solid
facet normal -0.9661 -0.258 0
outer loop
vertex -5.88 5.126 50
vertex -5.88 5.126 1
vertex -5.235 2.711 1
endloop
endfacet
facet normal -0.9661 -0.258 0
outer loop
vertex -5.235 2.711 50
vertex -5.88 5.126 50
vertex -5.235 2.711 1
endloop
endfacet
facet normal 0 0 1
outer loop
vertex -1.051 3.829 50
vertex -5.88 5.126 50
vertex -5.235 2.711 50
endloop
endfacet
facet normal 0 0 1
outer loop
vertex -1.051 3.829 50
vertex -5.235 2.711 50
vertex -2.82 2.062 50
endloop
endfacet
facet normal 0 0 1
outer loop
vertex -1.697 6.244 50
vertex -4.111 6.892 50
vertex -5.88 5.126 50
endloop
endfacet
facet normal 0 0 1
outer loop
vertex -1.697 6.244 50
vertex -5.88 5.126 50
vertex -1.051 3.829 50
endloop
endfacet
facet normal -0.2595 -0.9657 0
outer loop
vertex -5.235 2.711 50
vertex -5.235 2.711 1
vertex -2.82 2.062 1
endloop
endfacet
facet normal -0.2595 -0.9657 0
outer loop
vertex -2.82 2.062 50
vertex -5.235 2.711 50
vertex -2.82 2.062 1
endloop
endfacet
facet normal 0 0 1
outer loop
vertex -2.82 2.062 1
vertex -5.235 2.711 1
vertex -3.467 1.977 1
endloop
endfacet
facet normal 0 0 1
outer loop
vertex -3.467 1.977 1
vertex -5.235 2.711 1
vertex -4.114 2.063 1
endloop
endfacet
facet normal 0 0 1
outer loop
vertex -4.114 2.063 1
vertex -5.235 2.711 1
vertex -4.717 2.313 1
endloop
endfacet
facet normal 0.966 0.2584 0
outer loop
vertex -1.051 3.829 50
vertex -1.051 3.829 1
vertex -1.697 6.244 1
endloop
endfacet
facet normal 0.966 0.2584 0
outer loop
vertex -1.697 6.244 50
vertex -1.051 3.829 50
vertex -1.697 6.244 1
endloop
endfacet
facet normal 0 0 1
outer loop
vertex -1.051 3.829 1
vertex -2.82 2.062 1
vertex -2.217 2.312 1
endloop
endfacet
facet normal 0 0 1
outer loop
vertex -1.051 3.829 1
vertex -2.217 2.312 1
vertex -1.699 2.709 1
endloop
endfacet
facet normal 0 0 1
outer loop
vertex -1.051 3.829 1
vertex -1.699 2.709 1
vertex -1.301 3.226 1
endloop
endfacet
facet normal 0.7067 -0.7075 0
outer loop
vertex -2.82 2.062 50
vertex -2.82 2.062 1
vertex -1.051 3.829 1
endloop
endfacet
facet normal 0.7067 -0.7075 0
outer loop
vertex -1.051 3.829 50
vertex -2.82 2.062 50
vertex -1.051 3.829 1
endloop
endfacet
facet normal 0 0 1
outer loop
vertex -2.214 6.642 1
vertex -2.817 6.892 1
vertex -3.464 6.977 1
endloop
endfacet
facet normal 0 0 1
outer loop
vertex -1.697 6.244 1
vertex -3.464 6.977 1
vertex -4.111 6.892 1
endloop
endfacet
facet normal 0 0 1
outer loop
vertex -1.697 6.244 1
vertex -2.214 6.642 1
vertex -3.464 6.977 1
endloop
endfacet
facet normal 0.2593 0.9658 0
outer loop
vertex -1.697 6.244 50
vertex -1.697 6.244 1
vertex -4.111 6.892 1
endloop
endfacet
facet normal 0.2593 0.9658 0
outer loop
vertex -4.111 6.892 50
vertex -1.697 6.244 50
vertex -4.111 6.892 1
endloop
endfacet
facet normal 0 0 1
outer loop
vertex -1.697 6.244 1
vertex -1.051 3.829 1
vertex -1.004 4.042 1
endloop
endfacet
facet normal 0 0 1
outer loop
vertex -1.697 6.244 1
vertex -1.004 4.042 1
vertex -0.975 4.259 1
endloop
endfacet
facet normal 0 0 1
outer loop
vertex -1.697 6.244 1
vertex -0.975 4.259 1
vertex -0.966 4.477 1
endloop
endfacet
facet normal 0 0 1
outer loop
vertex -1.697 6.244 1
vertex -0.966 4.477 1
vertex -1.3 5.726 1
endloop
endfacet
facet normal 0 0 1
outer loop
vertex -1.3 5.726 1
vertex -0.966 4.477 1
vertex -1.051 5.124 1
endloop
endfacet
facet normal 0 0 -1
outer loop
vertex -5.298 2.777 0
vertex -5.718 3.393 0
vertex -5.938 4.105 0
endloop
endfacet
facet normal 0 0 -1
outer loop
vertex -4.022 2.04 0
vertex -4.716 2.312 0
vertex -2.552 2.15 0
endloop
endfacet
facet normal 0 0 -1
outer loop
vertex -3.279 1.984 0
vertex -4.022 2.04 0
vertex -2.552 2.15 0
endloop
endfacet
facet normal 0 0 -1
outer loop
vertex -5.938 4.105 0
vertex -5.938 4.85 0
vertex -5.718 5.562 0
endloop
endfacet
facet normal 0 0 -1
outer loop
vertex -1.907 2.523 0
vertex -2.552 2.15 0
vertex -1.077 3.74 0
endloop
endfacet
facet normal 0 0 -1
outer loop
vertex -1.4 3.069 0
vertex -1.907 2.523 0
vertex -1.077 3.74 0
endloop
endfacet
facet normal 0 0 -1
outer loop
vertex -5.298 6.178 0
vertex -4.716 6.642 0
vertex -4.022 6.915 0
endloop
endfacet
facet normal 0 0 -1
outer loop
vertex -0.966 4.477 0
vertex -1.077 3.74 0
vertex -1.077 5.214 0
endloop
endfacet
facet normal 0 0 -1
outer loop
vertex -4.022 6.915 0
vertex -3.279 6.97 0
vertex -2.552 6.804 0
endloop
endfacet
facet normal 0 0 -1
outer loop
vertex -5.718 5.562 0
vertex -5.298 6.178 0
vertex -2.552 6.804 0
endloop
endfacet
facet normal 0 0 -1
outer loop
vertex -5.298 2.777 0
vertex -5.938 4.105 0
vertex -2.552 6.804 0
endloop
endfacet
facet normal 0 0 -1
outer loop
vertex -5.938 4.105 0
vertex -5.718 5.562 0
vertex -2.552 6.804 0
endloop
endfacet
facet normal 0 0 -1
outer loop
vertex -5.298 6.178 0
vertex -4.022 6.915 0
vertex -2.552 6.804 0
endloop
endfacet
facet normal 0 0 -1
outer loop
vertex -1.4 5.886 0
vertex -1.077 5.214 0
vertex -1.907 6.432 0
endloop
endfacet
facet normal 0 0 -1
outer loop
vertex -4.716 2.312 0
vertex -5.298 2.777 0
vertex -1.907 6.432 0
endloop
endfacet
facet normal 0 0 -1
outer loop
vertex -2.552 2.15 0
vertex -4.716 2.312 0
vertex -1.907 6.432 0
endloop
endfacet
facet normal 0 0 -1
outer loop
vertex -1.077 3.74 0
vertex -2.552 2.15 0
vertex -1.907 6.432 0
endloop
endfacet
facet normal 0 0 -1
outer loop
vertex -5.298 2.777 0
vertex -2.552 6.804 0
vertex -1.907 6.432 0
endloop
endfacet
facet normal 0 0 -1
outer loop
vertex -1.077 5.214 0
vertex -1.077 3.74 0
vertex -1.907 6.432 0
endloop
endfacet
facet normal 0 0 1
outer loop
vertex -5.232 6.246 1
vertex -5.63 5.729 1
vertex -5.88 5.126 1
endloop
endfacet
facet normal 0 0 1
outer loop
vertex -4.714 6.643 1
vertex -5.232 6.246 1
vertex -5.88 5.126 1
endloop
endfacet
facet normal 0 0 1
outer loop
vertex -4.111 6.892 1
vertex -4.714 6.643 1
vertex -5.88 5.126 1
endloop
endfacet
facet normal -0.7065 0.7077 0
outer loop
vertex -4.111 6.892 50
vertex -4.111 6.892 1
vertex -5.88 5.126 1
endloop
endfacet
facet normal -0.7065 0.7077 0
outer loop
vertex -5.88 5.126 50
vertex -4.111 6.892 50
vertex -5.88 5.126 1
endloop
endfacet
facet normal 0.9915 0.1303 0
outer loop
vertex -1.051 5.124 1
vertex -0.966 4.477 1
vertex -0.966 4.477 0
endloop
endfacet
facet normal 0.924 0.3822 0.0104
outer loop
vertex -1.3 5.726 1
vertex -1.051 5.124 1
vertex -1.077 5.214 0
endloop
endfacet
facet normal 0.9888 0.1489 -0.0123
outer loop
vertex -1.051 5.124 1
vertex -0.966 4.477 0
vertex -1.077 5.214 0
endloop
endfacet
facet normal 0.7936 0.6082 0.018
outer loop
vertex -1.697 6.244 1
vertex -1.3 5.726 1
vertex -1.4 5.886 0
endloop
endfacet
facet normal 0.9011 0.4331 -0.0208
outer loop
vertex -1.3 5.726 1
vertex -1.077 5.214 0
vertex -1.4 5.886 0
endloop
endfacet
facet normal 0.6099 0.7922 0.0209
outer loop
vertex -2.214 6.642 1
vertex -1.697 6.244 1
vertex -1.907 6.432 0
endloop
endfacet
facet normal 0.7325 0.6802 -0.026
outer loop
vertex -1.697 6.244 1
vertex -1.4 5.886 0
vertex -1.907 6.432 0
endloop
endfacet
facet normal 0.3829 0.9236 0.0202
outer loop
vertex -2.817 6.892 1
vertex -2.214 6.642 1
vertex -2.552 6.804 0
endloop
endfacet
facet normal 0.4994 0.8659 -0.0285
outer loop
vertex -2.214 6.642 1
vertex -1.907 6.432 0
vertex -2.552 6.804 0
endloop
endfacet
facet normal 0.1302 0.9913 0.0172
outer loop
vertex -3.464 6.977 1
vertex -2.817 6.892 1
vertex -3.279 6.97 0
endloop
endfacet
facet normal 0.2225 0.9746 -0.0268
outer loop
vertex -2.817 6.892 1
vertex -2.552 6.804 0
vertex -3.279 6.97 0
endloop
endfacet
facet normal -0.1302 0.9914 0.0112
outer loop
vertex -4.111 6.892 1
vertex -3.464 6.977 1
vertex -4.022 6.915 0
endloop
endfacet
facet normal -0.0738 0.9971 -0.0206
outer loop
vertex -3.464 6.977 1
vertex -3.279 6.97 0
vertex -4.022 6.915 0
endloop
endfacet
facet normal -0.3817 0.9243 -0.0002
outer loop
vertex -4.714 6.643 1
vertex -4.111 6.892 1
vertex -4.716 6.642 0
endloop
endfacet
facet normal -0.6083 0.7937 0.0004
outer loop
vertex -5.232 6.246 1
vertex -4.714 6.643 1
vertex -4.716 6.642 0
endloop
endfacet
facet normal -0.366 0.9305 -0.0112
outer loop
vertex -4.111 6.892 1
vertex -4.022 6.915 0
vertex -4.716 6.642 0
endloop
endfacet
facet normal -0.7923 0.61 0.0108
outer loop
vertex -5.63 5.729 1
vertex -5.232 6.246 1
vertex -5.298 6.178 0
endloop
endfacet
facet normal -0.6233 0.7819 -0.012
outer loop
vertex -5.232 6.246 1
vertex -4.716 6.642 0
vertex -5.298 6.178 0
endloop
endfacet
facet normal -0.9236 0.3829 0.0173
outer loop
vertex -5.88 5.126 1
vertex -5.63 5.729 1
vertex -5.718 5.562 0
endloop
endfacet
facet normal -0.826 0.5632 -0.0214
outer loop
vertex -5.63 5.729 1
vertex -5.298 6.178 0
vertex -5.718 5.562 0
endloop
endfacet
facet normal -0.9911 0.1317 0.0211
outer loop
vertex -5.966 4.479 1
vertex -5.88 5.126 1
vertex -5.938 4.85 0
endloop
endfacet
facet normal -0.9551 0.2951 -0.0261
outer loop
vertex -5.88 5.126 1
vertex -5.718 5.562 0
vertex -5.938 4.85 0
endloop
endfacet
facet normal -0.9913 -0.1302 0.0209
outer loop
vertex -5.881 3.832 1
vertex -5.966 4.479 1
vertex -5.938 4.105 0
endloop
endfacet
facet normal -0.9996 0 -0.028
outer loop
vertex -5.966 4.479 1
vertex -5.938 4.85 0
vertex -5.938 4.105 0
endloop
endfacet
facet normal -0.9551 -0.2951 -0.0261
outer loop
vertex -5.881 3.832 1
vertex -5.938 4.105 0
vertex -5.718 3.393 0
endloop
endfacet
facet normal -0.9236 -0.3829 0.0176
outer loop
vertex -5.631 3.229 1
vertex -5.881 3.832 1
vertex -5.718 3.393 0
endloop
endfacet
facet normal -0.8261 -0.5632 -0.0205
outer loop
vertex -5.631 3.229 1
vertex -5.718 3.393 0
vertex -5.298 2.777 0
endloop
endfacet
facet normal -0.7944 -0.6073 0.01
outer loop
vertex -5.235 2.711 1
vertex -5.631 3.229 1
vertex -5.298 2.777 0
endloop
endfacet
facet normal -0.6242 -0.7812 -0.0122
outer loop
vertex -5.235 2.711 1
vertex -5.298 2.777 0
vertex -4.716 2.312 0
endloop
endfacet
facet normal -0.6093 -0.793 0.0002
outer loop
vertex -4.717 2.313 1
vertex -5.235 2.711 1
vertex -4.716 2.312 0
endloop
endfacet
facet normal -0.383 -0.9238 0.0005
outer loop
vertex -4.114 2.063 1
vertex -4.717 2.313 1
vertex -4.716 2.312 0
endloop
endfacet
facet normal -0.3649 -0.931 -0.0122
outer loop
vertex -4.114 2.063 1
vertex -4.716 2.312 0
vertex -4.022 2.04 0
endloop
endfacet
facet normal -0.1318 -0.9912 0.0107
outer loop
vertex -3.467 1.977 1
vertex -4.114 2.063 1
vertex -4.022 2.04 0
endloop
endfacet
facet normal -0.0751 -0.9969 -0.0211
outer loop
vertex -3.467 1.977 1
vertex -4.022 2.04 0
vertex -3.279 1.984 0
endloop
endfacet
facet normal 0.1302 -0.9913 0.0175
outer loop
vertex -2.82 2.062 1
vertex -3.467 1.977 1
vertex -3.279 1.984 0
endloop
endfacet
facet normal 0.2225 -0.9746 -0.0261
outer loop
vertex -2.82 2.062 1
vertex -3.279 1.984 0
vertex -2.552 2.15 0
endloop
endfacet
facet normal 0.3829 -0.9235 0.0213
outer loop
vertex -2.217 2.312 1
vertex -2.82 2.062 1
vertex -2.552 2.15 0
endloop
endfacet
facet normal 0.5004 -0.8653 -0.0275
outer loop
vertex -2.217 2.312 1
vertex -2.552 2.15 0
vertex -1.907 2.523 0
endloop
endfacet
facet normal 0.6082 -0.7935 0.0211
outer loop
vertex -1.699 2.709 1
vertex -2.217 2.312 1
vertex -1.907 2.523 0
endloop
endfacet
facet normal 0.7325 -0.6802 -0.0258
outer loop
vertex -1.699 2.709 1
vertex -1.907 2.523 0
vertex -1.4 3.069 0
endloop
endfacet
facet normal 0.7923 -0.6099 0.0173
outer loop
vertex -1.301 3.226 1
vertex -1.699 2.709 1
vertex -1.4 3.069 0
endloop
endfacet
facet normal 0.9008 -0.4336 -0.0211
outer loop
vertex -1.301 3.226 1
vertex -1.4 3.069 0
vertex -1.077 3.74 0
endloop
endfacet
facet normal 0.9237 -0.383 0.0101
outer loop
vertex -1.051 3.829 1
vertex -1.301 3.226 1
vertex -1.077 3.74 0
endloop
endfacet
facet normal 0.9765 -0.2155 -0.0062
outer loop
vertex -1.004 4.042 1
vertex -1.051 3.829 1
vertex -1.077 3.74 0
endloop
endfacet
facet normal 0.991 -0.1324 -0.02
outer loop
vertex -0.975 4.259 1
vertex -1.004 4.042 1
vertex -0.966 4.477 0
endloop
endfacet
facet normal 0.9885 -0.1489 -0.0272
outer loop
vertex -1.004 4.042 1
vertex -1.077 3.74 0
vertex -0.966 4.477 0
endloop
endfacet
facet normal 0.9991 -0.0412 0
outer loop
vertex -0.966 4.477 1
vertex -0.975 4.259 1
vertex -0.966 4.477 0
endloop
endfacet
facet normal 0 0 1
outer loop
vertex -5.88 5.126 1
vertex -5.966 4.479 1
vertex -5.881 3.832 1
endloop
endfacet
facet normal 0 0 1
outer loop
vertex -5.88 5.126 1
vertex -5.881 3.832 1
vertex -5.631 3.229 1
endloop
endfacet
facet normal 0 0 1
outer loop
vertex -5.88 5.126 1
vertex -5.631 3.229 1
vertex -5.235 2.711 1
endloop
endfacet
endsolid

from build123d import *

# Parameters (mm, degrees)
CROQUIS1_R              = 2.5
SALIENTE_EXTRUIR2_DEPTH = 1
SALIENTE_EXTRUIR3_DEPTH = 49


with BuildPart() as part:
    # Croquis1 → Saliente-Extruir2 (new body)
    with BuildSketch(Plane.XY):
        with Locations((-3.465701934, 4.477303942)):
            Circle(CROQUIS1_R)
    extrude(amount=SALIENTE_EXTRUIR2_DEPTH)

    # Croquis2 → Saliente-Extruir3 (add)
    with BuildSketch(Plane.XY.offset(1)):
        Polygon((-1.051265683, 3.828846087), (-1.696902833, 6.244038144), (-4.111339084, 6.892495999), (-5.880138185, 5.125761797), (-5.234501035, 2.71056974), (-2.820064784, 2.062111885), align=None)
    extrude(amount=SALIENTE_EXTRUIR3_DEPTH)


solid = part.part
